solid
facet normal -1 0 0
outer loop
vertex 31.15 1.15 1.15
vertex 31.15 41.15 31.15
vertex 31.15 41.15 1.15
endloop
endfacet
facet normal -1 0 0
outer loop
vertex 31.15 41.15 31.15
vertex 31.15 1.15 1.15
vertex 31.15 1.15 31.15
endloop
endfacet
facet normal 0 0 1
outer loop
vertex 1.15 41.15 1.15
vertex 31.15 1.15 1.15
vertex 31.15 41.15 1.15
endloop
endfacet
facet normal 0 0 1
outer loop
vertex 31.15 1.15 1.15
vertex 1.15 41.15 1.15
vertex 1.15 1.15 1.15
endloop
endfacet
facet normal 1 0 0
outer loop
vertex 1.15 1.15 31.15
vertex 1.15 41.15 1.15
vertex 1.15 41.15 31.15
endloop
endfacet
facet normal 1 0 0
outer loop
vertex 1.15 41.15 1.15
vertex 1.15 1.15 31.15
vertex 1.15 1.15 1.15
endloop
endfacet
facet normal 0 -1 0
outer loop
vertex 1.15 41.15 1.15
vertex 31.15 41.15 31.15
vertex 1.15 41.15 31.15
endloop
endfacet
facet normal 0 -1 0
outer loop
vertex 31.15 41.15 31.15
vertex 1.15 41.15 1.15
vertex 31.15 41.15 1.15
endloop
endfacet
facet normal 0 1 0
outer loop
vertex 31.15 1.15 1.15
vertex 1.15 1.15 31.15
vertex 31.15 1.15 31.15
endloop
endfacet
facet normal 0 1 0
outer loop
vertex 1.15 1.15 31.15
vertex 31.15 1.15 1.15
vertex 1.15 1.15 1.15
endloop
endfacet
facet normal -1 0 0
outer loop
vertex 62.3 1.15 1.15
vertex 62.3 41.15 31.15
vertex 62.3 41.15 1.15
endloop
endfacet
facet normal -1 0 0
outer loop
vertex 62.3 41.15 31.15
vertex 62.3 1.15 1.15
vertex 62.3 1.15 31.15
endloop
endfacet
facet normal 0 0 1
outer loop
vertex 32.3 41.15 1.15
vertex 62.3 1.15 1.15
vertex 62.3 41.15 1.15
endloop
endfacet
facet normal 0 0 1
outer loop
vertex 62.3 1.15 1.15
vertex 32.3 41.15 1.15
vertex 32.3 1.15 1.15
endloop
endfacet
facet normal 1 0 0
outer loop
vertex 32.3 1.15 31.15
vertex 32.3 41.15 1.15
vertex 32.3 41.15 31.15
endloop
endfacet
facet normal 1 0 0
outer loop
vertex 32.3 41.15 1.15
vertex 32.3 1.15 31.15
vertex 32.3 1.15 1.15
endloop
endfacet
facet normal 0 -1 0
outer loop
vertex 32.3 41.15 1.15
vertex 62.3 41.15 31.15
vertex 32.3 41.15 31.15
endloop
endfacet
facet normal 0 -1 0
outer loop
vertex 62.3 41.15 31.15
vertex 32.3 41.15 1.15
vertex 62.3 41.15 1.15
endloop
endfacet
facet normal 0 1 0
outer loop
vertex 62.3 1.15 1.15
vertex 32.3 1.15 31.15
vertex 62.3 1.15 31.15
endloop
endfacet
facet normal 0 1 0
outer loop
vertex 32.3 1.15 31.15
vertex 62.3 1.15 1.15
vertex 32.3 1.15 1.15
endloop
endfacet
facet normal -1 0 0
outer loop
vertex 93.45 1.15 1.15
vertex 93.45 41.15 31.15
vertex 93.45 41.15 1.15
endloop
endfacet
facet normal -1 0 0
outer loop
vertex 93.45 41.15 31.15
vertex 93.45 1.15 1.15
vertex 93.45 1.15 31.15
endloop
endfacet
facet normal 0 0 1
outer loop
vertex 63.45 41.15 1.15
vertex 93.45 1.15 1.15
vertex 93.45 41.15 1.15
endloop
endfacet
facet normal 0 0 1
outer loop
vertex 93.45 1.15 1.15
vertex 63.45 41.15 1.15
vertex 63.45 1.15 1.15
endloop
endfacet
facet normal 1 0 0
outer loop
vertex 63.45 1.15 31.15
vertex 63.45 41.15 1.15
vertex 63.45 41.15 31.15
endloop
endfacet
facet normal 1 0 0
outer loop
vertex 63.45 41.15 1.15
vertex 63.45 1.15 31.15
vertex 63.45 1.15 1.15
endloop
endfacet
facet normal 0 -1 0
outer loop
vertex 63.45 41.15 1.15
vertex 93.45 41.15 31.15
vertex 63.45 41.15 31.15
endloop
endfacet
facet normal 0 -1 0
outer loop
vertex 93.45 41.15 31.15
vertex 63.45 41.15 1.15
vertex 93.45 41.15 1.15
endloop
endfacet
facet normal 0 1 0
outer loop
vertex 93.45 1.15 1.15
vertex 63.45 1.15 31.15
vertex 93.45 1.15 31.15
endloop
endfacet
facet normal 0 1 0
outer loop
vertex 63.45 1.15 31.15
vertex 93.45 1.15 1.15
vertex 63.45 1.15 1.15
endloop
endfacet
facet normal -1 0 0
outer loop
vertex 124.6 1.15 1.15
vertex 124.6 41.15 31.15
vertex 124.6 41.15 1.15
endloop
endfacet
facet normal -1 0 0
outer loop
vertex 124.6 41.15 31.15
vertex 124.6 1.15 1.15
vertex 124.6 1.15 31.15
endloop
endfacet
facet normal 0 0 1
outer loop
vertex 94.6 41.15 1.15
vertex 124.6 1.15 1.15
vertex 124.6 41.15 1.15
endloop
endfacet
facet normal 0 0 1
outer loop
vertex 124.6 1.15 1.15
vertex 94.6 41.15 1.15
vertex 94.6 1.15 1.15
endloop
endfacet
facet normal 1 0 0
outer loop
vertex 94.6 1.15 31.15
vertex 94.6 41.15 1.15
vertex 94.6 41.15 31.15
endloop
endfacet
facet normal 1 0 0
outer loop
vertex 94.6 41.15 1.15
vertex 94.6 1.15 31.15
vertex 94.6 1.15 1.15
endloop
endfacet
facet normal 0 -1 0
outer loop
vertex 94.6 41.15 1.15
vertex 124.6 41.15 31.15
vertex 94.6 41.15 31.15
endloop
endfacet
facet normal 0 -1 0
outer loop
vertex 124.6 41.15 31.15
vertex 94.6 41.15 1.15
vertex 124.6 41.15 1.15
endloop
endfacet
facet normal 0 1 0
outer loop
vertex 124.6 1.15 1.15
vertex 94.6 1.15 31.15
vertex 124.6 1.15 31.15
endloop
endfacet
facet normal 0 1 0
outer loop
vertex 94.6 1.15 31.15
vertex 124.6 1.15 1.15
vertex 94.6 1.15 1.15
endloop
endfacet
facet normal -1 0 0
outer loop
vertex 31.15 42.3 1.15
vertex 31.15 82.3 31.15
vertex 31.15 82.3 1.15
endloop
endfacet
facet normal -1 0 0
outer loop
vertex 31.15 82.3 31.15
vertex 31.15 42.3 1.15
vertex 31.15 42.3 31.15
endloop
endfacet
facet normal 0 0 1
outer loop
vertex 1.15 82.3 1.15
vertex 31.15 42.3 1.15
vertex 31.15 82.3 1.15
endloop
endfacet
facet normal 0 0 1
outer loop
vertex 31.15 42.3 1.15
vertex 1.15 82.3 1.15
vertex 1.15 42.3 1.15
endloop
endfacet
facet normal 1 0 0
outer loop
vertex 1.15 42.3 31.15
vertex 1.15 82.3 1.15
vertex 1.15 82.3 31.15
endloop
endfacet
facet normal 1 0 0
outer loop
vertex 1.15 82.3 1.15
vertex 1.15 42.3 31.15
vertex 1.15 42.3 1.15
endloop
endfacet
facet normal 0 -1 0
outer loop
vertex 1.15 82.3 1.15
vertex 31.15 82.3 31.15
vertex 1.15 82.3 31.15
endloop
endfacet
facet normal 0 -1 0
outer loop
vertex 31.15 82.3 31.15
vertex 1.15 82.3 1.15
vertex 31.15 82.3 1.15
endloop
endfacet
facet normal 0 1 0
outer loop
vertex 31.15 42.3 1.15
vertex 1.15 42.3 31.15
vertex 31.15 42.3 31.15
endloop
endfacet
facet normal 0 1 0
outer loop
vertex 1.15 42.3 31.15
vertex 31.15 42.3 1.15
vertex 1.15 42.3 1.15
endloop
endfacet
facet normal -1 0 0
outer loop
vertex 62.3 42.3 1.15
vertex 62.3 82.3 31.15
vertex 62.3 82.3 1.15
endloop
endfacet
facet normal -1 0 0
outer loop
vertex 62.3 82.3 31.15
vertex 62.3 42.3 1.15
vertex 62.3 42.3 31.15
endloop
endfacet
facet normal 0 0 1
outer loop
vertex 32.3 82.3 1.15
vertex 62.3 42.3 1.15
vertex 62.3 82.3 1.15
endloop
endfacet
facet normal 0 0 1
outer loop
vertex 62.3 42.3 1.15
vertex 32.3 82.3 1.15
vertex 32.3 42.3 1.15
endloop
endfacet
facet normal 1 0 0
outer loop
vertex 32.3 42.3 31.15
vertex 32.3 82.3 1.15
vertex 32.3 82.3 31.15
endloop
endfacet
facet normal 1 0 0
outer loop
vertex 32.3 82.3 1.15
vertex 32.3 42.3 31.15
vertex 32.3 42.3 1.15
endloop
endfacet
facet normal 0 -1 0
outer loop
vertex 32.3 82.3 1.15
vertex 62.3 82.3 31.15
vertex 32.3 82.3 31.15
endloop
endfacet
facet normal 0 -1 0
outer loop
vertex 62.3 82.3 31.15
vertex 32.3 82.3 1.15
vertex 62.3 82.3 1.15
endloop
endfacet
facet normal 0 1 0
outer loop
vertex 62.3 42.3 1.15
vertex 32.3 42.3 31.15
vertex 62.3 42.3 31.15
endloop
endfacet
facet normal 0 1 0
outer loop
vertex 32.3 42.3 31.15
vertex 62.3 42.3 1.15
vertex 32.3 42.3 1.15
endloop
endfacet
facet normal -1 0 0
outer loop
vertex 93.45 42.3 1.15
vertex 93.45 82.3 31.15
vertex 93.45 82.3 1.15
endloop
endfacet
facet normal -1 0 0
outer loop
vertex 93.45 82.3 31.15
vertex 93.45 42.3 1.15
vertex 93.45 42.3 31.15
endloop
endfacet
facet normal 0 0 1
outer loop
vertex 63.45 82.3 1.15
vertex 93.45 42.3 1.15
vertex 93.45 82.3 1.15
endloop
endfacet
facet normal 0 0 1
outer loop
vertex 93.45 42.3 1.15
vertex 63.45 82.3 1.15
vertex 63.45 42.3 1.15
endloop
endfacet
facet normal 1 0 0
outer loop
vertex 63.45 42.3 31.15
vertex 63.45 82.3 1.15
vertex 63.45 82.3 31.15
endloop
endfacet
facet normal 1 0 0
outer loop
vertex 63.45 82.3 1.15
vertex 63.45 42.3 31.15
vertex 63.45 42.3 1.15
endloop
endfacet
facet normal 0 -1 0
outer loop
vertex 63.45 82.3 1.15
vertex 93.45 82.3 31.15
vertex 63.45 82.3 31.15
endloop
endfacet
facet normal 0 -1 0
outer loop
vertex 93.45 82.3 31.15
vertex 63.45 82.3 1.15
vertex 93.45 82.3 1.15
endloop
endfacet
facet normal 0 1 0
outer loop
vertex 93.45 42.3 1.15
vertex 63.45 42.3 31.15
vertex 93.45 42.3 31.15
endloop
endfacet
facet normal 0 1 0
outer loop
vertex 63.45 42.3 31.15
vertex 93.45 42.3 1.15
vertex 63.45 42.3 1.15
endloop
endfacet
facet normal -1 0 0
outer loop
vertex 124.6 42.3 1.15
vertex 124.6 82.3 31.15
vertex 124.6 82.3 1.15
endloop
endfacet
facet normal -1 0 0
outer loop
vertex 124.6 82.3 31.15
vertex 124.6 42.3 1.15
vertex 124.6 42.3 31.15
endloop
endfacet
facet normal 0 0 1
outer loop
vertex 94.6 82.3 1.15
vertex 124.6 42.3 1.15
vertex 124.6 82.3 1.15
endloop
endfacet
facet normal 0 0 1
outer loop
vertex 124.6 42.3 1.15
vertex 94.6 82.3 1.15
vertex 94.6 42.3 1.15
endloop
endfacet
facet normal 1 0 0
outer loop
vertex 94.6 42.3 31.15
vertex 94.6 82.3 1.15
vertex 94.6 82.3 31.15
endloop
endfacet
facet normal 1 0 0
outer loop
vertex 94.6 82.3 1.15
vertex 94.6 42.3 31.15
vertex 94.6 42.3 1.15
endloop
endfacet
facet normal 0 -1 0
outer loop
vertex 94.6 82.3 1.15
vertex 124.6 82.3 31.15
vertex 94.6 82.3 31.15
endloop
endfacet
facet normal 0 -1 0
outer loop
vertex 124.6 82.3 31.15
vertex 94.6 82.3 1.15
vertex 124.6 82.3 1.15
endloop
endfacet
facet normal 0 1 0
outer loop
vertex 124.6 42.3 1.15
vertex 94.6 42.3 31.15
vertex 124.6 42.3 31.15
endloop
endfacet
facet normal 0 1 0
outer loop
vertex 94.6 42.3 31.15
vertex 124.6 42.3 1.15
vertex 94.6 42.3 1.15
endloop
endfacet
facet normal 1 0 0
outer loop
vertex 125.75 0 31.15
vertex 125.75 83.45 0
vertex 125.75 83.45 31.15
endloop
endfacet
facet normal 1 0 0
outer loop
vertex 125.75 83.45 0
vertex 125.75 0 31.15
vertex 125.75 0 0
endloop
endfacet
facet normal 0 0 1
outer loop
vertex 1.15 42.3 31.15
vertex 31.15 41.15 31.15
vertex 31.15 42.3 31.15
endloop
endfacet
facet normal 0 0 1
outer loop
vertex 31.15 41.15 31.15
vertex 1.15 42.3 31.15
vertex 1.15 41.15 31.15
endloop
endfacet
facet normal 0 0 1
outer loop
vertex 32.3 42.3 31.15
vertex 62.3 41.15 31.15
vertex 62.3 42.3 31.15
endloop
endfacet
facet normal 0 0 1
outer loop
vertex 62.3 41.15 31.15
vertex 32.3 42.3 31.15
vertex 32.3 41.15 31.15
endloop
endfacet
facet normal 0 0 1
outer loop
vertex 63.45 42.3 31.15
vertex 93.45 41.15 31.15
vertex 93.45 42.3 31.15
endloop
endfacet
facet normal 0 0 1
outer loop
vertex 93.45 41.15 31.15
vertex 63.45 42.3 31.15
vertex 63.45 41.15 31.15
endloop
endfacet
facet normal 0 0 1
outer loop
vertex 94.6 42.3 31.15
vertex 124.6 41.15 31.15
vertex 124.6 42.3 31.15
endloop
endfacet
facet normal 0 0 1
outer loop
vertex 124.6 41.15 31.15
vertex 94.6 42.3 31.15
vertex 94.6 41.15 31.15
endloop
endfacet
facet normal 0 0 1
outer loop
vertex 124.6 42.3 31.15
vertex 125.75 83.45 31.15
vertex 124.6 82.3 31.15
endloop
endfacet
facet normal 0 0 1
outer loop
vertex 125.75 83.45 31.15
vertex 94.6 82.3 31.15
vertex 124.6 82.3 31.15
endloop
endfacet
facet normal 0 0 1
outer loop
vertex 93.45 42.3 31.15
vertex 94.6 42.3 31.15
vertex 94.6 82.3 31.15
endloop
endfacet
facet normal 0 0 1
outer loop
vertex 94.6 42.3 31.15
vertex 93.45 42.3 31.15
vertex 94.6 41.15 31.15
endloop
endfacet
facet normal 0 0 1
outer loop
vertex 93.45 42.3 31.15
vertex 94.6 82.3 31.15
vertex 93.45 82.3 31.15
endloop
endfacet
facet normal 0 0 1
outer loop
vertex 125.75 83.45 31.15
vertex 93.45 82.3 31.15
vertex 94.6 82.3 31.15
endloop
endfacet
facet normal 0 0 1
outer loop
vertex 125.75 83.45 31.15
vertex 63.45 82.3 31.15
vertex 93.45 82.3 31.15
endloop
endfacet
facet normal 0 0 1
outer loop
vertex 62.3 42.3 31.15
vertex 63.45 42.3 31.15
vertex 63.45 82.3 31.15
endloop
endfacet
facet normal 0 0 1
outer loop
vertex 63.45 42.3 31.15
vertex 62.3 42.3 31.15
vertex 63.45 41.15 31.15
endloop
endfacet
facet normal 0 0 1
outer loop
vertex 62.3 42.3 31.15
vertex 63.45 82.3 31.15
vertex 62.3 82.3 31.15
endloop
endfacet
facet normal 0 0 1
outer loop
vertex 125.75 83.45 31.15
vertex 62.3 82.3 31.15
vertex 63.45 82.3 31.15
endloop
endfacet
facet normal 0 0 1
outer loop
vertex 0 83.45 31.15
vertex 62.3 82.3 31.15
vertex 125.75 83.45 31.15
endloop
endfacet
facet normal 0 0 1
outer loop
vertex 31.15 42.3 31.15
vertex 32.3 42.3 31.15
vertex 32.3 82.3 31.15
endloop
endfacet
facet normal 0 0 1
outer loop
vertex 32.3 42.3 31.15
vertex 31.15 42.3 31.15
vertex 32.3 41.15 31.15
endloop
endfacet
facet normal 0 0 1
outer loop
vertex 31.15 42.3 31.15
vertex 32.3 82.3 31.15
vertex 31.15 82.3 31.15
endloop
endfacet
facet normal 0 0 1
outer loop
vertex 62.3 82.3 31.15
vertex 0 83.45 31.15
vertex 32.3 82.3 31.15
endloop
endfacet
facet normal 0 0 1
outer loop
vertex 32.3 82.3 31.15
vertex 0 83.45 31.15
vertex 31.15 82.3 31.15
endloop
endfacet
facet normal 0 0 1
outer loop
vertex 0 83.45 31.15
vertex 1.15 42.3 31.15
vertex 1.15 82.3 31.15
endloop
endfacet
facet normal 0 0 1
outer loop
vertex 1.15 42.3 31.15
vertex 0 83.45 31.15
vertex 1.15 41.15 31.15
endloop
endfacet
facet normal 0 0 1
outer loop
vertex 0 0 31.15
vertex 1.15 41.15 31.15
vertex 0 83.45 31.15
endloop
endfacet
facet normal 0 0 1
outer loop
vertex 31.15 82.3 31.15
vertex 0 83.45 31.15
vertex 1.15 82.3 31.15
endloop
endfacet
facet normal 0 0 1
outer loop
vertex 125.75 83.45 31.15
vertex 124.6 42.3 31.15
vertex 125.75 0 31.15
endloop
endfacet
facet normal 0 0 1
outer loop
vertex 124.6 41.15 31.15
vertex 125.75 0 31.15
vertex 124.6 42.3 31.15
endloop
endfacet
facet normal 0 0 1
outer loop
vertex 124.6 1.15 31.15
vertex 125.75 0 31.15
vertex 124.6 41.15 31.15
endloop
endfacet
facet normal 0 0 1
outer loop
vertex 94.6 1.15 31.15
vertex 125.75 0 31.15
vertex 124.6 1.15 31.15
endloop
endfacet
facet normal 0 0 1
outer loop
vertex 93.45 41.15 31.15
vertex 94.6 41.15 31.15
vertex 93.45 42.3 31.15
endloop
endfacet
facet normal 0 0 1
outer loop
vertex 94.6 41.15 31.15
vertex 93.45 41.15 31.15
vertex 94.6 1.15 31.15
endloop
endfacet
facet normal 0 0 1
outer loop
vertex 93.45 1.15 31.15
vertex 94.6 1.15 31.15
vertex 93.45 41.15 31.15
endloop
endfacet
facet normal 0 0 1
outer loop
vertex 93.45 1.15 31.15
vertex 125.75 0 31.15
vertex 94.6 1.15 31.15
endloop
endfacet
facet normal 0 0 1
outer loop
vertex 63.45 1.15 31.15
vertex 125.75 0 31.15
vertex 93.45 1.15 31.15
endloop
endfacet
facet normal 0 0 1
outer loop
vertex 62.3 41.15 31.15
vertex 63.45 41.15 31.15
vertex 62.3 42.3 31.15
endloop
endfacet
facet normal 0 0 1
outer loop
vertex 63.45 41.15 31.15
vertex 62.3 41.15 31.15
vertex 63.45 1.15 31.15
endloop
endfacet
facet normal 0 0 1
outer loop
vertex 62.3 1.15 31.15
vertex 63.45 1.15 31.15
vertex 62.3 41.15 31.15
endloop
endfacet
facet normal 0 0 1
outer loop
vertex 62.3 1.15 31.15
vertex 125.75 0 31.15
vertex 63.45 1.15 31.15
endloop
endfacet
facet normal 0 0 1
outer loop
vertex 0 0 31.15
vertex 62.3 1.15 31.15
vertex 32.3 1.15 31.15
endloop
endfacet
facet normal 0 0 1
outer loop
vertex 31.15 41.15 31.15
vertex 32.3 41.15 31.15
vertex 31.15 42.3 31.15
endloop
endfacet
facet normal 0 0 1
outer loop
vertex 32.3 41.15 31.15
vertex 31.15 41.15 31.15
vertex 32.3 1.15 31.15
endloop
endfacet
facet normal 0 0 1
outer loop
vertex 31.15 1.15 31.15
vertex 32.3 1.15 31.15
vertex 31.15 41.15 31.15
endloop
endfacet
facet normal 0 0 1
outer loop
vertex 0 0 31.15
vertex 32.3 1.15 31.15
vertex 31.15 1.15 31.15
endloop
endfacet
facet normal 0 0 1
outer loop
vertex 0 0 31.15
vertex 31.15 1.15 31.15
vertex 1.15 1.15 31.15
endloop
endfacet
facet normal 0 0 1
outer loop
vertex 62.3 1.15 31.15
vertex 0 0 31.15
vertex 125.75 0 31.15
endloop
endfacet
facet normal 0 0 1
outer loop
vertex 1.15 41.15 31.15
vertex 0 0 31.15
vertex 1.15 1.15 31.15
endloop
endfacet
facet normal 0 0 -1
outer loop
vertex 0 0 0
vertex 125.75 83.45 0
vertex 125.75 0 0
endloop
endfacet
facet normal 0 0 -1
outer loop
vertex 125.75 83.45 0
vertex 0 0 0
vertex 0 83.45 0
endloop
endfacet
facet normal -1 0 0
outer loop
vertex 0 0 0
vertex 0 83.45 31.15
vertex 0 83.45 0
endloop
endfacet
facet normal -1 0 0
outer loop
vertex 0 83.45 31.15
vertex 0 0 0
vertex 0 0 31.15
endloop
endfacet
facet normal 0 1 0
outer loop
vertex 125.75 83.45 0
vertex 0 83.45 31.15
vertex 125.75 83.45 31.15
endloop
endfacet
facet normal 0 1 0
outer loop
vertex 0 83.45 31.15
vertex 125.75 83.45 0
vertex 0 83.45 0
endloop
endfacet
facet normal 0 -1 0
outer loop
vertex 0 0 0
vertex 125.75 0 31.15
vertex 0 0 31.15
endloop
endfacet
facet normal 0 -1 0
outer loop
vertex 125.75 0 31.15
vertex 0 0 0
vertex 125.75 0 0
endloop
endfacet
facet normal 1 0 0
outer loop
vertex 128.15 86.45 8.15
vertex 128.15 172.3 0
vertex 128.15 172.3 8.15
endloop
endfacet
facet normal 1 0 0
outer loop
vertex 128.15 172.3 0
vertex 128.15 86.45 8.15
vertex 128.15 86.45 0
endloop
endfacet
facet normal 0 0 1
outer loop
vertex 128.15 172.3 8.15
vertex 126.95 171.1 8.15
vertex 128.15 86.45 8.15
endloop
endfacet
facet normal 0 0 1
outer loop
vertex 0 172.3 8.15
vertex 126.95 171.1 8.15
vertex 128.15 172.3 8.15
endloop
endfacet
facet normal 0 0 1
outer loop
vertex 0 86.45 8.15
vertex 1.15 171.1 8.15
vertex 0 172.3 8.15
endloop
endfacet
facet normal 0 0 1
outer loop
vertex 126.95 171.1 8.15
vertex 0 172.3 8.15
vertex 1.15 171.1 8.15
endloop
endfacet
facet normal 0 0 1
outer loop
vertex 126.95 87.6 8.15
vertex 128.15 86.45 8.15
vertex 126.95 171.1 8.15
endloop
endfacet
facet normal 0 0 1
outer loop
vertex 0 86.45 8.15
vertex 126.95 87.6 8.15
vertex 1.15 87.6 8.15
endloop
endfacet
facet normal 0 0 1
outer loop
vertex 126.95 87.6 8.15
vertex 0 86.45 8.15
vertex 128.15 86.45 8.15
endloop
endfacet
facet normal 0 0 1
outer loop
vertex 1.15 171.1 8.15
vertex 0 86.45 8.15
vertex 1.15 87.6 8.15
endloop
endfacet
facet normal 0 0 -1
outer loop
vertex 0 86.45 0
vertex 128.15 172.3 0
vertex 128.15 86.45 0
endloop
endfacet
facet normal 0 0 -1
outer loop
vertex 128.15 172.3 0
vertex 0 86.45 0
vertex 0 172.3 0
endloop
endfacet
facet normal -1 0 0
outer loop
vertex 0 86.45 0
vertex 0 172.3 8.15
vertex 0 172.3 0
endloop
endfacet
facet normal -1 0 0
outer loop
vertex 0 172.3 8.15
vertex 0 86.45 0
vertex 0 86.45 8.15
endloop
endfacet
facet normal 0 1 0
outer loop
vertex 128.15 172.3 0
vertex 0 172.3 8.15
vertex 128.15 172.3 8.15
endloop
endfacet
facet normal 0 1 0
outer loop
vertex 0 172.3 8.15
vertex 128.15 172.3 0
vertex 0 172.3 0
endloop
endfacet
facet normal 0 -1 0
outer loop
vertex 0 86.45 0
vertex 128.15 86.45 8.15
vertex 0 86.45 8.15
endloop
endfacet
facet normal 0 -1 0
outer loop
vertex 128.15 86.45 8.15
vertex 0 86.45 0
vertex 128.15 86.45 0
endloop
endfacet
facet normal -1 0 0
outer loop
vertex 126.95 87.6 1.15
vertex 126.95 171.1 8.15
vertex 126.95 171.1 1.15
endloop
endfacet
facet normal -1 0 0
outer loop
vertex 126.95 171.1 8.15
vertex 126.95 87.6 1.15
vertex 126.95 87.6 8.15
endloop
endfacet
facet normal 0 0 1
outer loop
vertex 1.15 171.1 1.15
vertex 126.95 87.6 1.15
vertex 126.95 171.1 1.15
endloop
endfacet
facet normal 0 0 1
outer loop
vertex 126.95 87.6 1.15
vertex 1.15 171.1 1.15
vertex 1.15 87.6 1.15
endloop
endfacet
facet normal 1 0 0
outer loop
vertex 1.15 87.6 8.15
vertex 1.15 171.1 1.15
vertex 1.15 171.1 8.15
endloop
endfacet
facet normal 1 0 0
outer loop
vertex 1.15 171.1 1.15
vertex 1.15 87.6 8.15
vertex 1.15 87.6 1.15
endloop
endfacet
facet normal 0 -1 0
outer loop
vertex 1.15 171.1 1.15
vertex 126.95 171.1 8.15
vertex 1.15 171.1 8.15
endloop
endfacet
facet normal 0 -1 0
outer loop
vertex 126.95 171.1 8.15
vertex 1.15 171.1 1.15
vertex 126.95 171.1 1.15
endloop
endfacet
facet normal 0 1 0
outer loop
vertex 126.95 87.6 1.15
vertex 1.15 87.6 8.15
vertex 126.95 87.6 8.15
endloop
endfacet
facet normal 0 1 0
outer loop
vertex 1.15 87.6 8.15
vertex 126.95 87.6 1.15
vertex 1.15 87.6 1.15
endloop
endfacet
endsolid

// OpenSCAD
/* [Global] */


// Whether or not to generate the box
generate_box="yes"; //[yes, no]

// Whether or not to generate the lid
generate_lid="yes"; //[yes, no]

showlid = generate_lid=="yes"? true : false;

showbox = generate_box=="yes"? true : false;

Type_of_Lid = "Standard";//[Standard, Sliding]




// Size of compartments, X
compx = 30;	


// Size of compartments, Y
compy = 40;	


// Width of wall, Make slightly larger then n*nozzle diameter. i.e. 1.15 for a 0.5 nozzle, should give a 2-pass thick wall
wall = 1.15;


// Number of compartments, X
nox = 4;


// Number of compartments, Y
noy = 2;



// Depth of compartments
deep = 30;	





// Tolerance around lid.  If it's too tight, increase this. If it's too loose, decrease it. 0.15 recommended for sliding lid
tolerance=.05;



// This is how far away from the box to print the lid
lidoffset=3;		


// How far the lid goes down the sides of the box. Only applies to Standard lid
lid_drop=7;
lidheight=lid_drop+wall;

//Adds a divit to sliding lid to make opening easer, no effect on standard lid
Thumb_Divit="yes"; //[yes, no]

includethumbhole = Thumb_Divit =="no"? false : true;


//Add a coin slot above every compartment
Coin_Slot="no"; //[yes, no]

includecoinslot=Coin_Slot == "no"? false: true;


//Size of Coin slot in X direction, default is slot thickness for United States Coins. Reverse X and Y to swap direction of slot
coinx=2.5;	
//Size of Coin slot in Y direction, default is slot width for United States Coins. Reverse X and Y to swap direction of slot
coiny=26;	



/* [Hidden] */

lidtype = Type_of_Lid == "Standard"? 0 : 1;	// 0=Flat lid.  Use "1" for lid that slides off in the x direction



				// Z tolerance can be tweaked separately, to make the top of the sliding lid
				// be flush with the top of the box itself.  Default is zero.  Warning: this also
				// adds wiggle room to the lid.
                //Hidden from customizer, because more likely to mess up the box then help it.
ztolerance=0;

////////////////////
//start of objects
////////////////////

totalheight = deep + (lidtype*wall);
thumbrad = min(20,noy*(compy+wall)/3);

if (showbox) {
difference() {
	cube ( size = [nox * (compx + wall) + wall, noy * (compy + wall) + wall, (totalheight + wall)], center = false);


	for ( ybox = [ 0 : noy - 1])
		{
             for( xbox = [ 0 : nox - 1])
			{
			translate([ xbox * ( compx + wall ) + wall, ybox * ( compy + wall ) + wall, wall])
			cube ( size = [ compx, compy, totalheight+1 ]);
			}
		}
	if (lidtype==1) {
			translate ([0,wall/2,deep+wall]) 
			polyhedron ( points = [   
							[0,0,0], 
							[0,noy*(compy+wall),0], 
							[nox*(compx+wall)+wall/2,0,0], 
							[nox*(compx+wall)+wall/2,noy*(compy+wall),0],
							[0,wall/2,wall], 
							[0,noy*(compy+wall)-wall/2,wall], 
							[nox*(compx+wall)+wall/2,wall/2,wall], 
							[nox*(compx+wall)+wall/2,noy*(compy+wall)-wall/2,wall]
							],
						faces = [ 
							[0,2,1], [1,2,3], [4,5,6], [5,7,6]	,		// top and bottom
							[0,4,2], [4,6,2], [5,3,7], [5,1,3]	,		// angled sides
							[0,1,4], [1,5,4], [2,6,3], [3,6,7]			// trapezoidal ends
							]);
			translate ([0,wall/2,deep+wall-ztolerance])
			cube (size=[nox*(compx+wall)+wall/2,noy*(compy+wall),ztolerance],center=false);
			}

	}
}

if (showlid) {
translate ([0,noy*(compy+wall)+wall+lidoffset,0])
difference () { union () {	// for including coin slot
	if (lidtype==1) { 
		difference () {
		polyhedron ( points = [   
						[0,0,0], 
						[0,noy*(compy+wall)-2*tolerance,0], 
						[nox*(compx+wall)-tolerance+wall/2,0,0], 
						[nox*(compx+wall)-tolerance+wall/2,noy*(compy+wall)-2*tolerance,0],
						[0,wall/2,wall], 
						[0,noy*(compy+wall)-wall/2-2*tolerance,wall], 
						[nox*(compx+wall)-tolerance+wall/2,wall/2,wall], 
						[nox*(compx+wall)-tolerance+wall/2,noy*(compy+wall)-wall/2-2*tolerance,wall]
						],
					faces = [ 
						[0,2,1], [1,2,3], [4,5,6], [5,7,6]	,		// top and bottom
						[0,4,2], [4,6,2], [5,3,7], [5,1,3]	,		// angled sides
						[0,1,4], [1,5,4], [2,6,3], [3,6,7]			// trapezoidal ends
						]);
		// Thumb hole
		if (includethumbhole==true) {
			intersection () {
			translate ([min(8,nox*(compx+wall)/8),(noy*(compy+wall))/2,thumbrad+wall/2]) sphere (r=thumbrad, center=true, $fn=60);
			translate ([min(8,nox*(compx+wall)/8),0,0]) cube (size=[20,(noy*(compy+wall)),20], center=false);
		}
	}

		}
	} else {

	difference() {
	cube ( size = [nox * (compx + wall) + 3 * wall + 2* tolerance, noy * (compy + wall) + 3 * wall + 2*tolerance, lidheight], center = false);

	translate ([wall,wall,wall])
	cube ( size = [nox * (compx + wall) +wall+tolerance, noy * (compy + wall) + wall + tolerance, lidheight+1], center = false);
	}
} // if lidtype
} // union
if (includecoinslot==true) {
	for ( yslot = [ 0 : noy - 1])
		{
             for( xslot = [ 0 : nox - 1])
			{
			translate([ xslot * ( compx + wall ) + (2-lidtype)*wall + (compx-coinx)/2, yslot * ( compy + wall ) + wall*(2-3*lidtype/2) + (compy-coiny)/2, 0])
			cube ( size = [ coinx, coiny, wall ]);
			}
		}
	}
} //difference
} // if showlid
